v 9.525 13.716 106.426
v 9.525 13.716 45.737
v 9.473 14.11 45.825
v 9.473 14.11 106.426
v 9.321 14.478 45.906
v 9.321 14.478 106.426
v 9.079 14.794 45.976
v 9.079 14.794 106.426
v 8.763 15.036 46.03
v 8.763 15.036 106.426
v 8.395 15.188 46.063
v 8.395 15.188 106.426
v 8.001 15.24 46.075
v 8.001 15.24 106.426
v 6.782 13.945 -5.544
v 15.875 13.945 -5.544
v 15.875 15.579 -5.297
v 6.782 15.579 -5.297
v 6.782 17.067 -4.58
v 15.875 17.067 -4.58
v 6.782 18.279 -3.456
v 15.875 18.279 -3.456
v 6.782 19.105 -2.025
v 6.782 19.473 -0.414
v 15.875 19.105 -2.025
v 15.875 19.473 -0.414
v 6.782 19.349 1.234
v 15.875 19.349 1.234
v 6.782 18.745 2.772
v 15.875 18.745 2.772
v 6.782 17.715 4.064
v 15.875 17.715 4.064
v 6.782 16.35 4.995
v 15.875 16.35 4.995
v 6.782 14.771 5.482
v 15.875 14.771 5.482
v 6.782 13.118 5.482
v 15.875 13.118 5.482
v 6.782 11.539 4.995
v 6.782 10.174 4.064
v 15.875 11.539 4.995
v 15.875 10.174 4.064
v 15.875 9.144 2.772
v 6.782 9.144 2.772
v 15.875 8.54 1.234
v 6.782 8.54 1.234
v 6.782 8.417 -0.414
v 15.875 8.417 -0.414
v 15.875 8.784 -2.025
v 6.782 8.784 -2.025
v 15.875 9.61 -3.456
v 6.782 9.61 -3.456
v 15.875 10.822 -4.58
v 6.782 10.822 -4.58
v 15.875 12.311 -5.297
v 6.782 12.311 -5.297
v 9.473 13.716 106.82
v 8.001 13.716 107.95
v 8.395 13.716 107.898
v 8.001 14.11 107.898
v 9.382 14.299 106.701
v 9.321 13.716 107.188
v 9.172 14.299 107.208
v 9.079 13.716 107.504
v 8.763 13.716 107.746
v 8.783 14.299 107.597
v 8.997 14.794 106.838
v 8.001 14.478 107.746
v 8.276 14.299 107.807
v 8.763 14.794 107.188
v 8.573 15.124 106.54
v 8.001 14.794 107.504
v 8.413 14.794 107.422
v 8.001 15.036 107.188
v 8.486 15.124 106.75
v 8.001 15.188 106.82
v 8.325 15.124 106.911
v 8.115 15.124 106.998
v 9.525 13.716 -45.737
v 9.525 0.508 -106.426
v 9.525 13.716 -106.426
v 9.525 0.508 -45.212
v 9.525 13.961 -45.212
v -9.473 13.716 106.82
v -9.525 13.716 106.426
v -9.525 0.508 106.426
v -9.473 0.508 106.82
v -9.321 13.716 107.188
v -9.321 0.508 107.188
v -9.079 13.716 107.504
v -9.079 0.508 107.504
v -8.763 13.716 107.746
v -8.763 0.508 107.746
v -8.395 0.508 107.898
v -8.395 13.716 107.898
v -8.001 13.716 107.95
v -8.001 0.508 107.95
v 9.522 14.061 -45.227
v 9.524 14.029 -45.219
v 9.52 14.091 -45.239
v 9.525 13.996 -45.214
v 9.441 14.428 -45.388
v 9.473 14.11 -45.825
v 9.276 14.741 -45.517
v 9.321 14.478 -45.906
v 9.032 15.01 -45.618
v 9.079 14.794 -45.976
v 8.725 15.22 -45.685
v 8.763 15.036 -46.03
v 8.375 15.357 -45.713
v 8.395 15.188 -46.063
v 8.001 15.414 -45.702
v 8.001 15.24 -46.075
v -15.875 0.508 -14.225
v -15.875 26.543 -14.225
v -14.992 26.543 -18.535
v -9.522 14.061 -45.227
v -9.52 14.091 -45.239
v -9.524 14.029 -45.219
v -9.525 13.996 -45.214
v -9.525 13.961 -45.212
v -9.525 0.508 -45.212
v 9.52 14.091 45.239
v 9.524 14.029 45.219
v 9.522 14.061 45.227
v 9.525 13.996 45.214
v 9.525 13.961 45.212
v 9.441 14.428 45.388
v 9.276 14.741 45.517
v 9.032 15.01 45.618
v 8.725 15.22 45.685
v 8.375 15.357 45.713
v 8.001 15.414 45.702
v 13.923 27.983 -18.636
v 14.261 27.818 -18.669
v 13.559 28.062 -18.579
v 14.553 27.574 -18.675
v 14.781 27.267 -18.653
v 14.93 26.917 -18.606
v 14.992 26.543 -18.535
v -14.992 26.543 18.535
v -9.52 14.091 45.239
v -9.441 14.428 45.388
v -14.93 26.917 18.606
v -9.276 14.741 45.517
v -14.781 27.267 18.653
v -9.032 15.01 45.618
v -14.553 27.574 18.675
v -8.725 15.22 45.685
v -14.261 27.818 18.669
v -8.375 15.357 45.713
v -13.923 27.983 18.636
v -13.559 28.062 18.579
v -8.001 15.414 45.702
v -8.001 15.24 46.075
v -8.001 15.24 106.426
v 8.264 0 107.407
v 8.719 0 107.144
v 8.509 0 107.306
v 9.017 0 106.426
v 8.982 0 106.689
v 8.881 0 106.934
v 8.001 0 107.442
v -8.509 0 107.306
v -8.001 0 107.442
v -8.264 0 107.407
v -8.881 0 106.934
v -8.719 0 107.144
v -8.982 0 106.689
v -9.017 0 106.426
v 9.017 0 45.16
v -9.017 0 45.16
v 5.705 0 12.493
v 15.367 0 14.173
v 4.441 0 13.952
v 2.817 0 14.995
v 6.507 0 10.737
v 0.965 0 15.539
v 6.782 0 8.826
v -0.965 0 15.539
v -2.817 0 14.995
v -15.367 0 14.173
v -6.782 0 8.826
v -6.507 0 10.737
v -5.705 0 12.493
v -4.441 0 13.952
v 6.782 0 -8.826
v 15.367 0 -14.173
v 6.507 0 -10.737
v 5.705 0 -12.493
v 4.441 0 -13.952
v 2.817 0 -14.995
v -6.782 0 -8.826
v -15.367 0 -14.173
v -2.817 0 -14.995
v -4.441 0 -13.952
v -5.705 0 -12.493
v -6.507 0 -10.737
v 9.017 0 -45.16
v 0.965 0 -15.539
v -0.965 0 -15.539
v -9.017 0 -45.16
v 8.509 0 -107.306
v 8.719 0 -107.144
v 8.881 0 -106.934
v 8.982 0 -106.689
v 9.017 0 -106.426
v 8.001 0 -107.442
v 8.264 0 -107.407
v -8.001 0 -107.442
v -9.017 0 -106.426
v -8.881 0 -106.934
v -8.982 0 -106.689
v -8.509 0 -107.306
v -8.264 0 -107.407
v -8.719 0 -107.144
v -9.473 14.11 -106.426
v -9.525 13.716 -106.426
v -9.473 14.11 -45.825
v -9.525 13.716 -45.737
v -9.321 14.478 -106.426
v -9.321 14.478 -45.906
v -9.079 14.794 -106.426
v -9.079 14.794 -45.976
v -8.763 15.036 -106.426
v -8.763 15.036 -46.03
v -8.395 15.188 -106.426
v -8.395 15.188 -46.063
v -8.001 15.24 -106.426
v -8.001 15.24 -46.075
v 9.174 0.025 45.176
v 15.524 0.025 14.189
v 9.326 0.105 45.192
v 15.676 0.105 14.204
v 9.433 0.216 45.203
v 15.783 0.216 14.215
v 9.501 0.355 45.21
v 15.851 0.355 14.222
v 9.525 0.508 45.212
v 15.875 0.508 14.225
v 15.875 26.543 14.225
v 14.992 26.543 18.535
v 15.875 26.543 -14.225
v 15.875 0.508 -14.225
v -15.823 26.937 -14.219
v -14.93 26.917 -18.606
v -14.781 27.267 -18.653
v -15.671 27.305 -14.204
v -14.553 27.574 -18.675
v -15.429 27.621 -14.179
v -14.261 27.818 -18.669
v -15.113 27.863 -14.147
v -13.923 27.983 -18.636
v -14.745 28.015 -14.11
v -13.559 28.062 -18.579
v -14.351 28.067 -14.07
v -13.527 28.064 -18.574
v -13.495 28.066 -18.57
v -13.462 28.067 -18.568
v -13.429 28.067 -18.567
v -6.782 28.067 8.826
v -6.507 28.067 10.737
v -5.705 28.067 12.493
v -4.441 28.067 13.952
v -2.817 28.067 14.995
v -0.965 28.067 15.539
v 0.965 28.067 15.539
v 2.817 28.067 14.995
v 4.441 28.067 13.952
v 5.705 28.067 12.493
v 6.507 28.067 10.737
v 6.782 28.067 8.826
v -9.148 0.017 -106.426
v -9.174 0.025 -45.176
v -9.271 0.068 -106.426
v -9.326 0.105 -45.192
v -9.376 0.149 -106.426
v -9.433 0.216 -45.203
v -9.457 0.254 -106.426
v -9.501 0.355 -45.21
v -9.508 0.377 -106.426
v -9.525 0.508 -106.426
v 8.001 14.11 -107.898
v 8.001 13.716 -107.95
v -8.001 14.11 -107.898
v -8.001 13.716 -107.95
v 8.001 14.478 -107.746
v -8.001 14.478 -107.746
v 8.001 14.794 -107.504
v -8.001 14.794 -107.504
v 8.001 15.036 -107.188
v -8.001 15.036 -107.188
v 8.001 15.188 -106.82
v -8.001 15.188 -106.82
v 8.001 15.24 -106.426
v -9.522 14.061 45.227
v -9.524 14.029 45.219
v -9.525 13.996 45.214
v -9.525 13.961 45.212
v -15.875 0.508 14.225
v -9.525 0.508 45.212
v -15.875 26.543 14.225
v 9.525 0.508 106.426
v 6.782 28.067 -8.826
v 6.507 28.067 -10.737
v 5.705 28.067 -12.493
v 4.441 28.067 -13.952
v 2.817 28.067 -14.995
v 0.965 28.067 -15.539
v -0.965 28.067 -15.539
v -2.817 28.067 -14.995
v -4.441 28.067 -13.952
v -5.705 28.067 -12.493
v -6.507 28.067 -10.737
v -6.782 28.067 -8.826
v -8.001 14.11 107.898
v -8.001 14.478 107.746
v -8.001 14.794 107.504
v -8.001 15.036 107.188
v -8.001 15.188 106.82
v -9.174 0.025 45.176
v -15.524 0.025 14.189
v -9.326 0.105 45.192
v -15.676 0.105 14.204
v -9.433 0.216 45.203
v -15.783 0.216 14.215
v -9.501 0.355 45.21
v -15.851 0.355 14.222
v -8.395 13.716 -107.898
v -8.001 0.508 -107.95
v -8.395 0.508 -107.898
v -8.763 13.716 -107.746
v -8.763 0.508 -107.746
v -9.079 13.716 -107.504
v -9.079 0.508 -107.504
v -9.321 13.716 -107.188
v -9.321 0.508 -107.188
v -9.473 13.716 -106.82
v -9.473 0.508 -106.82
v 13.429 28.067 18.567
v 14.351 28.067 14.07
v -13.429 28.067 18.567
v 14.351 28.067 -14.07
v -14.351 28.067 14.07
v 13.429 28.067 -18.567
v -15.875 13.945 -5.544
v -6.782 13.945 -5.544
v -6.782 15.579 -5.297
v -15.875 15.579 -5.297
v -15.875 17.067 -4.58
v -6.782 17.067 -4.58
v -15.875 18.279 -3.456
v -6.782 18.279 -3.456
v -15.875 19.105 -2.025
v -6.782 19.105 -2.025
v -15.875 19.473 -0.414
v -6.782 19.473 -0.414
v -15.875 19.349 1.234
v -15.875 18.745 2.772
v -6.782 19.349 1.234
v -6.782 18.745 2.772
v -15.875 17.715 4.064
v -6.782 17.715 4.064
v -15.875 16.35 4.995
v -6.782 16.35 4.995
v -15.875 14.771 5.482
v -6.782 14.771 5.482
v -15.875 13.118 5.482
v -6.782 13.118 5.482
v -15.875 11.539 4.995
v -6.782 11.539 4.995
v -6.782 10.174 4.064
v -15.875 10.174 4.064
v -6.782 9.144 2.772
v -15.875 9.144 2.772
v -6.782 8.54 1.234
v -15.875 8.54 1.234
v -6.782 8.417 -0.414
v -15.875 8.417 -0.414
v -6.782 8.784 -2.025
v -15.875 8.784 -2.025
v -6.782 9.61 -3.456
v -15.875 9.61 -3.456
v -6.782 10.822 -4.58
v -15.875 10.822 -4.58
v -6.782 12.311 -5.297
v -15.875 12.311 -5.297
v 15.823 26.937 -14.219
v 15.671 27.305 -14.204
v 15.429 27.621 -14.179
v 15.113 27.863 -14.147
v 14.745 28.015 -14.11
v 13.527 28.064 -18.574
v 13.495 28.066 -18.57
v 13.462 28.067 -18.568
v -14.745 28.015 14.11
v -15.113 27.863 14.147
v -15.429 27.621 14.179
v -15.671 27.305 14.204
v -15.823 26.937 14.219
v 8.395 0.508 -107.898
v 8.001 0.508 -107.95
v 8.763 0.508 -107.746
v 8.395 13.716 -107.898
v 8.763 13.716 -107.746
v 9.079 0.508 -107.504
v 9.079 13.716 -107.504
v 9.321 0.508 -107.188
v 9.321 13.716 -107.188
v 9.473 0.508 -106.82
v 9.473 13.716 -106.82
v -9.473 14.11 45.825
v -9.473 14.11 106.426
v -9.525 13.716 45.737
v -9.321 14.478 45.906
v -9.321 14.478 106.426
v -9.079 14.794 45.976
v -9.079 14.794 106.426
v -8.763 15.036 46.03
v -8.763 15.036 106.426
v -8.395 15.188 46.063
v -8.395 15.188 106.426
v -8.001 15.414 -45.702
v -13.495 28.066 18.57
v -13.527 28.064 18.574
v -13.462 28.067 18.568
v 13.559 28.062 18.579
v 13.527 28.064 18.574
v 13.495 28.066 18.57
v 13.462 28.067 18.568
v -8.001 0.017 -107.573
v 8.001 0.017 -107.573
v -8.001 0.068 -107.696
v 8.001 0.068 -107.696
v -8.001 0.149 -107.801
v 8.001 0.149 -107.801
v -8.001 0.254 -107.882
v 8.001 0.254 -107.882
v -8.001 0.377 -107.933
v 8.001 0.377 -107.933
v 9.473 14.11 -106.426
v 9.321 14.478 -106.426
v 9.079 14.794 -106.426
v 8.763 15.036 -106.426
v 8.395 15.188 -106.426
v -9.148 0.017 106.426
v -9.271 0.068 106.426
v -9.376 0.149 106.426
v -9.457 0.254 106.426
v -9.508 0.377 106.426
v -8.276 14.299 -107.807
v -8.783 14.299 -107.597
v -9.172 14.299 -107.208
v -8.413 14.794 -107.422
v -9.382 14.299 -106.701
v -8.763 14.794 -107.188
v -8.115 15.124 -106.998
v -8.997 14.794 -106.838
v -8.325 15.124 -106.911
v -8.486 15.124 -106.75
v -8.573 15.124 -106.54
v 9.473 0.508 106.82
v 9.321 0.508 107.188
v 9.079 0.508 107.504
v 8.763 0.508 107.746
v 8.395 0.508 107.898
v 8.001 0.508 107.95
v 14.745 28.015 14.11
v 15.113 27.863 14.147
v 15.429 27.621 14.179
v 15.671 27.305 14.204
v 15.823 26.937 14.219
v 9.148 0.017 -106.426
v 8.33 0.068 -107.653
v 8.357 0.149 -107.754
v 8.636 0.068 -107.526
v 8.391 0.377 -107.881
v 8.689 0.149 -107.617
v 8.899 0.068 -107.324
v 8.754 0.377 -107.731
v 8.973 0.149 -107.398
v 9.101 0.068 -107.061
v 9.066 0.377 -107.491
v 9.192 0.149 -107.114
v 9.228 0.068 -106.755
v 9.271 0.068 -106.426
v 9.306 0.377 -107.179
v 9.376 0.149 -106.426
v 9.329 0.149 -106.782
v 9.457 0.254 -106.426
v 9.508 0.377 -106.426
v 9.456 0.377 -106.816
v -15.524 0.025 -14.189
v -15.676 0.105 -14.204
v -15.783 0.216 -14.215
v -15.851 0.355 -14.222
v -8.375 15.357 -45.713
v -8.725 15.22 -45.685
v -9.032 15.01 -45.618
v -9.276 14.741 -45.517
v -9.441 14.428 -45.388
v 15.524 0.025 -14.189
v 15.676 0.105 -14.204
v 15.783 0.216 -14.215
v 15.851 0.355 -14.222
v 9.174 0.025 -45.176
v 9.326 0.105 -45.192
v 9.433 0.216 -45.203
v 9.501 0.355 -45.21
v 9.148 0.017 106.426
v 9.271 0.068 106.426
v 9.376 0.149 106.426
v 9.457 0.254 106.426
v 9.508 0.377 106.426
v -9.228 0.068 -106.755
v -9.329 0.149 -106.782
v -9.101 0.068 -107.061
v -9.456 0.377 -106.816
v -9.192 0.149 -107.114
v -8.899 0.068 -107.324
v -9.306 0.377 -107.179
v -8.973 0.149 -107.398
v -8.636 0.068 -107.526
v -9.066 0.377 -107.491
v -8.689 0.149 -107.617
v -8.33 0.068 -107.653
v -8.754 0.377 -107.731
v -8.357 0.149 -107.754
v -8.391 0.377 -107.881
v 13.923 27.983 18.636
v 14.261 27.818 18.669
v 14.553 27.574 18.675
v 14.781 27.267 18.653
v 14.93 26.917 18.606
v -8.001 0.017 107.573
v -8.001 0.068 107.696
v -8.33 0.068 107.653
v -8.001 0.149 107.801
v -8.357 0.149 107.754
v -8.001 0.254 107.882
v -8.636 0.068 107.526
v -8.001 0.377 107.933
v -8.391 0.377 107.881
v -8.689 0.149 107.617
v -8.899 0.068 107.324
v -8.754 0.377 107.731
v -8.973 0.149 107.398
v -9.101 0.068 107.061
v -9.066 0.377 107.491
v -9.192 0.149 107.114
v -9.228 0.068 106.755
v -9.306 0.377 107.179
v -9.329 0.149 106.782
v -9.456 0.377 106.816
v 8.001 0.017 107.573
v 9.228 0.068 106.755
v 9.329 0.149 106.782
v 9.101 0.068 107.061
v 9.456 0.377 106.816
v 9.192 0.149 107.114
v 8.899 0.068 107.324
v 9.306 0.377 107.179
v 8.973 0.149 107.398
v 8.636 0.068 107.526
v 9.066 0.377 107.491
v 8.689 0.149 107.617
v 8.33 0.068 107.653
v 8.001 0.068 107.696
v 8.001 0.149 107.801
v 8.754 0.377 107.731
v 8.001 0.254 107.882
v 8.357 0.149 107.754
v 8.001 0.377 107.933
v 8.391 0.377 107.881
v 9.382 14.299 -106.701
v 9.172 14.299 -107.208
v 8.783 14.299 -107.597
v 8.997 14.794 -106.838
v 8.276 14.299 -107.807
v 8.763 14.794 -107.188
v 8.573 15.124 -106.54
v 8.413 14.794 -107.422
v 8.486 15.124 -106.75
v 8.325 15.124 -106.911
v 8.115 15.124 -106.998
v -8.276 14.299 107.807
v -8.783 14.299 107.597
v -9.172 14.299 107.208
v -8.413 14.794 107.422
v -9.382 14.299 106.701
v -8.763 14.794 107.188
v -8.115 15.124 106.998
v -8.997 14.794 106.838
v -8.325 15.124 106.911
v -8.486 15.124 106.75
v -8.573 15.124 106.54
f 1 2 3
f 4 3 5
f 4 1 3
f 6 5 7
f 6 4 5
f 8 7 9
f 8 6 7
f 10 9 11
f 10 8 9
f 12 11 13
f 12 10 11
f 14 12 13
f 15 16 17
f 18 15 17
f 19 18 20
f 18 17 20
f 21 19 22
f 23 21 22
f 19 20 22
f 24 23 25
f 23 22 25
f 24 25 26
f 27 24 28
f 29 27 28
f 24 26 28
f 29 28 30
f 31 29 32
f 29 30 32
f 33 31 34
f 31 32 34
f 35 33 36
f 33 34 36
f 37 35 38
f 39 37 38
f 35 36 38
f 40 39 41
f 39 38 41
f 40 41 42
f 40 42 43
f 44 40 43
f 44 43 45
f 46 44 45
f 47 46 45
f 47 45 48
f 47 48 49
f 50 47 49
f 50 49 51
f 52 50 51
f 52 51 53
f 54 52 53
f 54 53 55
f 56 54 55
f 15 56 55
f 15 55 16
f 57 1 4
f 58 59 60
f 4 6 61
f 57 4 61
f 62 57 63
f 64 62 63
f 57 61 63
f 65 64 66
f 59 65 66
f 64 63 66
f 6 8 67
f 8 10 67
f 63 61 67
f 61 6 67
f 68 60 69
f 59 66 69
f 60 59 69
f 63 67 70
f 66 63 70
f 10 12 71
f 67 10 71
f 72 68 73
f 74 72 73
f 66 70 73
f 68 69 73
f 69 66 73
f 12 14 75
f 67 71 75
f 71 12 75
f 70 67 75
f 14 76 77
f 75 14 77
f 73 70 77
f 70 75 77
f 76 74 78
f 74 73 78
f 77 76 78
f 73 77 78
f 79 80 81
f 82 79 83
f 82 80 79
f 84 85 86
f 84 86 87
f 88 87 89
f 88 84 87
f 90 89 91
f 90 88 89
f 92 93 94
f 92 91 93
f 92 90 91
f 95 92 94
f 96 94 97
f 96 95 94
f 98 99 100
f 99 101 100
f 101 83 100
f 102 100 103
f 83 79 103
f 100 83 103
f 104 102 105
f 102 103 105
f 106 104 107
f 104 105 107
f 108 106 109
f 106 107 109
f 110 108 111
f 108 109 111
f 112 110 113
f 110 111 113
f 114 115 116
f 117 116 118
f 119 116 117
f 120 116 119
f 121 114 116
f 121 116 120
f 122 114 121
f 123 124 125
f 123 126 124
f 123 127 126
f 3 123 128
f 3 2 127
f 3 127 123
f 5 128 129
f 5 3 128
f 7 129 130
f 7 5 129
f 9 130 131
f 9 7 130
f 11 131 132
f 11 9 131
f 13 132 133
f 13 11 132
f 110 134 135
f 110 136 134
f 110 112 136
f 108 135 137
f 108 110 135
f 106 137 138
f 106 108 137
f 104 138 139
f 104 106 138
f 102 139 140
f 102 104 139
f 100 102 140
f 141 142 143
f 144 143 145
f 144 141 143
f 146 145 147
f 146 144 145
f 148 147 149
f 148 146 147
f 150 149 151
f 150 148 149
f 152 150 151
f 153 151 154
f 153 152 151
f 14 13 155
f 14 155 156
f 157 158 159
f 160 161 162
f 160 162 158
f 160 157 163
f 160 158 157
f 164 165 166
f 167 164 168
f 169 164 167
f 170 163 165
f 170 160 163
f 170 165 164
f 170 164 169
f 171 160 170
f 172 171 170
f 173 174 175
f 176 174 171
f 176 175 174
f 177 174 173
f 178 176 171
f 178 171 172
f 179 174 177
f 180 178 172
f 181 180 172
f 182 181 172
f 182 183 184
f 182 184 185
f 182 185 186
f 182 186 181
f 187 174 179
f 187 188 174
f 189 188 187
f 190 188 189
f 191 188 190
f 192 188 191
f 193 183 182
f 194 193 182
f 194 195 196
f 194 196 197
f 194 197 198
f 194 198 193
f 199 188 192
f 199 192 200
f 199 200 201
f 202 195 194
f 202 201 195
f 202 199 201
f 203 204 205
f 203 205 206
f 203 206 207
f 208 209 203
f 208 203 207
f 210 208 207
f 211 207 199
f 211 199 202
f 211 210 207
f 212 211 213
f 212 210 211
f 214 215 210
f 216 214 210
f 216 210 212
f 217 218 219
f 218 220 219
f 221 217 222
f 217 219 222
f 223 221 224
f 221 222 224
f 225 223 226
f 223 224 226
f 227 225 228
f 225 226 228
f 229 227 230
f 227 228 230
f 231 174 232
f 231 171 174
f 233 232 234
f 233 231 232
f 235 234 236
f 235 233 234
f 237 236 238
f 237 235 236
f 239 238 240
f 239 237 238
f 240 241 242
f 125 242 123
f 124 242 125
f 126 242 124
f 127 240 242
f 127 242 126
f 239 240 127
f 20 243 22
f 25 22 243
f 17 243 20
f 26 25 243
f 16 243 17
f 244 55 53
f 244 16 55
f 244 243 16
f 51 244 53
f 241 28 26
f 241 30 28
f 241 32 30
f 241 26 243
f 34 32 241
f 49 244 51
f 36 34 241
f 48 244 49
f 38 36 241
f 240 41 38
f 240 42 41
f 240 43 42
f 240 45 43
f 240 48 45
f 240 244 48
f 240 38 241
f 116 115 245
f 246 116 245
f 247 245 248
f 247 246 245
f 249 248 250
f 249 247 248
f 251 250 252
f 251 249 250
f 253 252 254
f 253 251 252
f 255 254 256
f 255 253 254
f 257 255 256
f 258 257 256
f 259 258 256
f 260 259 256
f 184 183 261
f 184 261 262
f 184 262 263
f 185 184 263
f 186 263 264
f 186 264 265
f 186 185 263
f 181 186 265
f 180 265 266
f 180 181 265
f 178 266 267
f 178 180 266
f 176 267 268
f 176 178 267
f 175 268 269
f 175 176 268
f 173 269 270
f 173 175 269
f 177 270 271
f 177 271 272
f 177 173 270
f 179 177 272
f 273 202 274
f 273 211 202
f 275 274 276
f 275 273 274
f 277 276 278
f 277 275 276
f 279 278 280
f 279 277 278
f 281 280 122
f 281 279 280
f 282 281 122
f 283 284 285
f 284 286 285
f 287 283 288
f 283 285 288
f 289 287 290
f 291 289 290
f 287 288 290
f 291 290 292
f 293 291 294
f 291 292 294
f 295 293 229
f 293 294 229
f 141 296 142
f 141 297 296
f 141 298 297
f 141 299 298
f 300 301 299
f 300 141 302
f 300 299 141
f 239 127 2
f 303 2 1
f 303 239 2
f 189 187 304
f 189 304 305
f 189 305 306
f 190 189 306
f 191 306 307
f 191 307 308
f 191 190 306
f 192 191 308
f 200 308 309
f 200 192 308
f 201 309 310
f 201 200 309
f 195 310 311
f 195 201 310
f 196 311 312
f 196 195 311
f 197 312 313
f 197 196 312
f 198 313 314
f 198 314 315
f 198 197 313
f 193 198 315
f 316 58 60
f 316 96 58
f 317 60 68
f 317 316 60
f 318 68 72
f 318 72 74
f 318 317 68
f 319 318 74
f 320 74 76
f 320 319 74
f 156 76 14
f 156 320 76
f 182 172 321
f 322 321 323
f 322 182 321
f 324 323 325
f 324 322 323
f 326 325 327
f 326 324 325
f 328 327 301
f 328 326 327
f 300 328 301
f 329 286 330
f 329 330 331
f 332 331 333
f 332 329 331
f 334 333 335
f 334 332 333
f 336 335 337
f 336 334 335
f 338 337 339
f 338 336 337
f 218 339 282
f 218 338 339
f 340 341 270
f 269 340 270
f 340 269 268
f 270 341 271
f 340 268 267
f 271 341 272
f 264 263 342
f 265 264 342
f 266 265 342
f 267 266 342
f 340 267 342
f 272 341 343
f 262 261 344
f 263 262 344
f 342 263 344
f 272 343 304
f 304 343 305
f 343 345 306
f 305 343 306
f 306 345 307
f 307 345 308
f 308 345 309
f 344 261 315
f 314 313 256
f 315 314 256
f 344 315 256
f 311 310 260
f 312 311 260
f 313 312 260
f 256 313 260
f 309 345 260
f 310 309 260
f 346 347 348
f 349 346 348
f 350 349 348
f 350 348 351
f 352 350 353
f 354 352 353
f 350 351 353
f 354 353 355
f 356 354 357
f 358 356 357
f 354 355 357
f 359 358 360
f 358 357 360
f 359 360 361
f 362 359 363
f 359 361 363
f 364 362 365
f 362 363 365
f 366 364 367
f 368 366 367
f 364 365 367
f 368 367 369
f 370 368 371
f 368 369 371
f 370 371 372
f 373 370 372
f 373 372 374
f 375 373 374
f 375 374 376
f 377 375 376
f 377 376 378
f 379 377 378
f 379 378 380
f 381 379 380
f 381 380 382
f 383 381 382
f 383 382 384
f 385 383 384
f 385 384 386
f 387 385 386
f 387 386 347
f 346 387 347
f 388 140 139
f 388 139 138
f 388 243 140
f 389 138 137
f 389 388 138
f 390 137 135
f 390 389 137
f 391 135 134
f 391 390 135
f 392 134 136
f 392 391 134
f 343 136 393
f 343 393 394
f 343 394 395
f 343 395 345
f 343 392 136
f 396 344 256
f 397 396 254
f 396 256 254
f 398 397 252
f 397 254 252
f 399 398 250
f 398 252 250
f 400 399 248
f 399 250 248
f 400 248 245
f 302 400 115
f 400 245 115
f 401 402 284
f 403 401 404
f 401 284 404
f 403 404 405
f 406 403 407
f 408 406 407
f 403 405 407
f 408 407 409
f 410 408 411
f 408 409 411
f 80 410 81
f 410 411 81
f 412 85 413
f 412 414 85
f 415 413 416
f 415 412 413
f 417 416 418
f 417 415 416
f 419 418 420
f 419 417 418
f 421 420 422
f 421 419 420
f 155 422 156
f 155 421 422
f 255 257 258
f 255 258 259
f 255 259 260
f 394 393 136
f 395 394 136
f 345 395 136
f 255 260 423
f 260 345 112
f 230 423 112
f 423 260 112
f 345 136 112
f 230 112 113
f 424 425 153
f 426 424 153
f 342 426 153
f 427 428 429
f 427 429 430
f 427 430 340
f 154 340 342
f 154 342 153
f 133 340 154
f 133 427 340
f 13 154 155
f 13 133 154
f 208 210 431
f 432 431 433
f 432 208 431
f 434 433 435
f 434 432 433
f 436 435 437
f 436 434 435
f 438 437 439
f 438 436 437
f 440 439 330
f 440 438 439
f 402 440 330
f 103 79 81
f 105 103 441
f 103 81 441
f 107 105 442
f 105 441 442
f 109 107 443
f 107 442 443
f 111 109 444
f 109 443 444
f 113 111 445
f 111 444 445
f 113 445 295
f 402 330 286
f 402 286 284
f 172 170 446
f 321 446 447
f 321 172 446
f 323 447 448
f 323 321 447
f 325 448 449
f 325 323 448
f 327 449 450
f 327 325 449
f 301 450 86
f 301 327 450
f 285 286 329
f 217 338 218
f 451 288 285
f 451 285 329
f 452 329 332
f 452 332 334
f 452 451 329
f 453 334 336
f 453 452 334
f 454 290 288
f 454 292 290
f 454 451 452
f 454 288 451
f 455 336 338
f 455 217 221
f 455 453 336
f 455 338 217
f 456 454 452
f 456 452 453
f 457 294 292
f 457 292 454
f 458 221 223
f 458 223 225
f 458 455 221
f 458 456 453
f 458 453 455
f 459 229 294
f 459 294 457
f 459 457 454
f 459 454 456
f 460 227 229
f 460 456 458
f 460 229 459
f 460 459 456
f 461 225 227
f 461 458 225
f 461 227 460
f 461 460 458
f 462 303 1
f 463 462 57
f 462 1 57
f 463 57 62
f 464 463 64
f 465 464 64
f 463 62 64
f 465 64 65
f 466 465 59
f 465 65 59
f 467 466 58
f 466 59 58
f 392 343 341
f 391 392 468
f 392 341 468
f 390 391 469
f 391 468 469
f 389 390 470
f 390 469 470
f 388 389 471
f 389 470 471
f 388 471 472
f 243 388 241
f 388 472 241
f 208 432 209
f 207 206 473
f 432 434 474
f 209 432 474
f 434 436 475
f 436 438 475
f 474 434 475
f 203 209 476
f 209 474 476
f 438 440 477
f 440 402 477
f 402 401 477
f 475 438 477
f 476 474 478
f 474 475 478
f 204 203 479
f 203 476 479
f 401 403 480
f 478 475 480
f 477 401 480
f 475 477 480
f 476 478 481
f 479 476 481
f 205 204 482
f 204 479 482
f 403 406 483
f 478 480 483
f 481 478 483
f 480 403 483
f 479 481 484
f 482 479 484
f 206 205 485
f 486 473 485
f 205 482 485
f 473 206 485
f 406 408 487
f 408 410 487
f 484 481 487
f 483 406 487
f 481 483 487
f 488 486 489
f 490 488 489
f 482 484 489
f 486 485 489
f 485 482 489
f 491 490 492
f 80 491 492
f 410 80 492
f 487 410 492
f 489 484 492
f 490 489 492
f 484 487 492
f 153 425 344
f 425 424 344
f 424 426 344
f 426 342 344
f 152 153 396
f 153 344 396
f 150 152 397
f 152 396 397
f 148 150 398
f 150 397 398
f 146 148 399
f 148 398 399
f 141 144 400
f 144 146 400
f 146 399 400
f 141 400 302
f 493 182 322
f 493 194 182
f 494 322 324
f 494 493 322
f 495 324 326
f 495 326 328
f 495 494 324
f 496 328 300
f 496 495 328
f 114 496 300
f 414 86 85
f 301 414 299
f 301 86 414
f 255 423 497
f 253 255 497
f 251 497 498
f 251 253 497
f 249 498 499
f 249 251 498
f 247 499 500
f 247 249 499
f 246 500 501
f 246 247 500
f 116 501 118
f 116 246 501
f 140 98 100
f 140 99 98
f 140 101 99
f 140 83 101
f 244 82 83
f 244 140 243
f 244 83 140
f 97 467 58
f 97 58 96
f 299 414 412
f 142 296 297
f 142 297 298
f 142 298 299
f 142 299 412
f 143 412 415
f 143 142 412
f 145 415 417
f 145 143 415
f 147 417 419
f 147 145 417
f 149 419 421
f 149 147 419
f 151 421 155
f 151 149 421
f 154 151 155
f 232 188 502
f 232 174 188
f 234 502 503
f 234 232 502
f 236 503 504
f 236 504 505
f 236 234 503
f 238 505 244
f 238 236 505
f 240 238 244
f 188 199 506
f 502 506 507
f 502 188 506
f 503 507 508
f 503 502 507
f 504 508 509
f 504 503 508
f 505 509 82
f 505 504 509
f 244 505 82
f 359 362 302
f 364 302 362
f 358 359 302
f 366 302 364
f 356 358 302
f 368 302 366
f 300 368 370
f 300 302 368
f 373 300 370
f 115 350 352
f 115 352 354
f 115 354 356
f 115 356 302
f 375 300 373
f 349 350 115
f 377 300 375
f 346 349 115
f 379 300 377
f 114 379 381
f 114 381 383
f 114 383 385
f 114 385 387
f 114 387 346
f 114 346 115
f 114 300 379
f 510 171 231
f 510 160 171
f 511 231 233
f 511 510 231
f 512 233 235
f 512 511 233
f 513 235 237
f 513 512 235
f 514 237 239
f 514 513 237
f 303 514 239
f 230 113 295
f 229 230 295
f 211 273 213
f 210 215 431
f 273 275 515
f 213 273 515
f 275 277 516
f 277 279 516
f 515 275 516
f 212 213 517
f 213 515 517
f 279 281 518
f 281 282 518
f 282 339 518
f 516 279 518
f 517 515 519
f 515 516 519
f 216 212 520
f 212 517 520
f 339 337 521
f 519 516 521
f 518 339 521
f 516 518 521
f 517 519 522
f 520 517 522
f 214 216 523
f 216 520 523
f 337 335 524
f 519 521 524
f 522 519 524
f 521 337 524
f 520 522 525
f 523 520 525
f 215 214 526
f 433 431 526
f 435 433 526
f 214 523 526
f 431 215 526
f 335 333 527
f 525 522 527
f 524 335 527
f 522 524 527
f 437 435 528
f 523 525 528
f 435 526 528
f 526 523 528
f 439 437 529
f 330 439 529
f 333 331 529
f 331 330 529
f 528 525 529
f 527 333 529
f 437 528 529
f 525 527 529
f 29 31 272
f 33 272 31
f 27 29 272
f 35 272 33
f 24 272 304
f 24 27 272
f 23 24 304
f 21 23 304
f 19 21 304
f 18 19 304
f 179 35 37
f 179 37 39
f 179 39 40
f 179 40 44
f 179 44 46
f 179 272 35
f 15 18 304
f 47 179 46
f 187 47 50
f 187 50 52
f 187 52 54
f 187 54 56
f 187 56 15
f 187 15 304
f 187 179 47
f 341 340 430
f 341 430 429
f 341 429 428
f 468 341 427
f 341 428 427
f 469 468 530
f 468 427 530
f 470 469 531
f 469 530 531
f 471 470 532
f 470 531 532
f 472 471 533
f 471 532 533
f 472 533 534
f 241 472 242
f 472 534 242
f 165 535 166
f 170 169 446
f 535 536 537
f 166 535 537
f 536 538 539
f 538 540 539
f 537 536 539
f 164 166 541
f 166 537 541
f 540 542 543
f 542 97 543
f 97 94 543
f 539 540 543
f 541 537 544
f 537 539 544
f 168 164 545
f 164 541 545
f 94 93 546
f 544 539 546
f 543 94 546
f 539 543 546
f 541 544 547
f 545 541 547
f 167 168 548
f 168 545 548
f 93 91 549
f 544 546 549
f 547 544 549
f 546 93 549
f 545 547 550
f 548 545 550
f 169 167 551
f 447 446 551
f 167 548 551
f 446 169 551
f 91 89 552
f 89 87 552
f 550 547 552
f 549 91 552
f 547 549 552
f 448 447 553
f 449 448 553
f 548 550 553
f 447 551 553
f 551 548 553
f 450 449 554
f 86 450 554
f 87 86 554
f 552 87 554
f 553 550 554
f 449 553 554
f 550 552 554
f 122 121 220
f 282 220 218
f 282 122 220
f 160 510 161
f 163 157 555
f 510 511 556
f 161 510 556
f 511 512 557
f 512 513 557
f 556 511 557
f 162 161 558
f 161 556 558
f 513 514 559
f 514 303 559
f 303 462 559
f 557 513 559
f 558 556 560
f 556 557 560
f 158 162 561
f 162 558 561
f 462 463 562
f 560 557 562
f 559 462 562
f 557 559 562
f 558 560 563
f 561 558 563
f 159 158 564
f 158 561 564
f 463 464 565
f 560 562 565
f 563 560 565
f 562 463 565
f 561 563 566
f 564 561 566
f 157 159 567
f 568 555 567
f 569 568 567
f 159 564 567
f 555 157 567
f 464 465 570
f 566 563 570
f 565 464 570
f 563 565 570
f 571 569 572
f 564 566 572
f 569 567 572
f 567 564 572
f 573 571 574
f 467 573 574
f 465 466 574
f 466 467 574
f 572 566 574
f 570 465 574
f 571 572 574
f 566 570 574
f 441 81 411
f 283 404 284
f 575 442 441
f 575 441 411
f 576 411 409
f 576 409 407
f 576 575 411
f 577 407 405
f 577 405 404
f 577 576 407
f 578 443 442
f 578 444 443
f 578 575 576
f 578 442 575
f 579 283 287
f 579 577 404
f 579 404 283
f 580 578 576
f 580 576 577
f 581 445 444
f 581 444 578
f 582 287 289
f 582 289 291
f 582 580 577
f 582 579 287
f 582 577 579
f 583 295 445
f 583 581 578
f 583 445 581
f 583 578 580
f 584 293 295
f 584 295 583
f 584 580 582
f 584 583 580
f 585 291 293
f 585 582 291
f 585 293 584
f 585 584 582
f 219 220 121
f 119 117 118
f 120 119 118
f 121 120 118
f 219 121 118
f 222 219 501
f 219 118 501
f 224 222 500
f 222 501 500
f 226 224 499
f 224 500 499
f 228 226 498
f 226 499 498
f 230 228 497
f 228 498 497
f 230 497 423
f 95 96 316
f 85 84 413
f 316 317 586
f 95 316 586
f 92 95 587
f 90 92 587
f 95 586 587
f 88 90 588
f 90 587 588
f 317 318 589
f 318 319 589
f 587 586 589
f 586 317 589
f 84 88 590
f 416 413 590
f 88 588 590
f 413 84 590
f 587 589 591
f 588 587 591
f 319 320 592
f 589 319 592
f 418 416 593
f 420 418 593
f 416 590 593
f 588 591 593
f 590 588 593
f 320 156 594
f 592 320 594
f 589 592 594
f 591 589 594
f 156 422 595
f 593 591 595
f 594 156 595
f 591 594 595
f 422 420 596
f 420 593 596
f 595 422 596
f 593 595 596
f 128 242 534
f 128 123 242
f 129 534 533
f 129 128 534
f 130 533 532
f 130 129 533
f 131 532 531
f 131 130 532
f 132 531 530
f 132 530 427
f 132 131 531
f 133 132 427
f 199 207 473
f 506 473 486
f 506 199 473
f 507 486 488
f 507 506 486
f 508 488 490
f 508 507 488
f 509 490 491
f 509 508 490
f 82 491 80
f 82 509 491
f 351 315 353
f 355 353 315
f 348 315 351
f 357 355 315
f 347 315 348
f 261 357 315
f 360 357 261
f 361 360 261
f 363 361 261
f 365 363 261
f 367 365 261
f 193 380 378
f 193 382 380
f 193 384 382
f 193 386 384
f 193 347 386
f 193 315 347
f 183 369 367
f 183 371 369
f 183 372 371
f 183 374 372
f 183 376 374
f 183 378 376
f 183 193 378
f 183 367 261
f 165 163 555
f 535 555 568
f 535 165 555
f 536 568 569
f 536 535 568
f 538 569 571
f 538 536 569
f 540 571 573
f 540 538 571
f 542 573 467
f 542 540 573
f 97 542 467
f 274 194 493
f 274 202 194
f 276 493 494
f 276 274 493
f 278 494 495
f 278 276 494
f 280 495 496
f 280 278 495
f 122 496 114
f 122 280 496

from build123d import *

# Parameters (mm, degrees)
EXTRUDE1_DEPTH     = 28.067
CUT_EXTRUDE1_DEPTH = 32.75
SKETCH3_R          = 5.54355
CUT_EXTRUDE2_DEPTH = 32.75
FILLET1_R          = 1.524
FILLET2_R          = 0.508
FILLET3_R          = 1.524


with BuildPart() as part:
    # Sketch1 → Extrude1 (new body)
    with BuildSketch(Plane(origin=(0, 0, 0), x_dir=(1, 0, 0), z_dir=(0, 1, 0))):
        Polygon((-9.525, 107.95), (9.525, 107.95), (9.525, 45.212), (15.875, 14.224508), (15.875, -14.224508), (9.525, -45.212), (9.525, -107.95), (-9.525, -107.95), (-9.525, -45.212), (-15.875, -14.224508), (-15.875, 14.224508), (-9.525, 45.212), align=None)
        with BuildLine():
            Line((-6.7818, 8.8265), (-6.7818, -8.8265))
            ThreePointArc((-6.7818, -8.8265), (0, -15.6083), (6.7818, -8.8265))
            Line((6.7818, -8.8265), (6.7818, 8.8265))
            ThreePointArc((6.7818, 8.8265), (0, 15.6083), (-6.7818, 8.8265))
        make_face(mode=Mode.SUBTRACT)
    extrude(amount=EXTRUDE1_DEPTH)

    # Sketch2 → Cut-Extrude1 (cut, through all)
    with BuildSketch(Plane(origin=(15.875, 0, 0), x_dir=(0, 0, -1), z_dir=(1, 0, 0))):
        Polygon((107.95, 28.067), (18.5674, 28.067), (46.074990269, 15.24), (107.95, 15.24), align=None)
        Polygon((-107.95, 15.24), (-107.95, 28.067), (-18.5674, 28.067), (-46.074990269, 15.24), align=None)
    extrude(amount=-CUT_EXTRUDE1_DEPTH, mode=Mode.SUBTRACT)

    # Sketch3 → Cut-Extrude2 (cut, through all)
    with BuildSketch(Plane(origin=(15.875, 0, 0), x_dir=(0, 0, -1), z_dir=(1, 0, 0))):
        with Locations((0, 13.9446)):
            Circle(SKETCH3_R)
    extrude(amount=-CUT_EXTRUDE2_DEPTH, mode=Mode.SUBTRACT)

    # Fillet1
    fillet1_edges = [part.edges().sort_by_distance(p)[0] for p in [
        (-9.525, 7.62, -107.95),
        (9.525, 7.62, -107.95),
        (9.525, 7.62, 107.95),
        (-9.525, 7.62, 107.95),
    ]]
    fillet(fillet1_edges, radius=FILLET1_R)

    # Fillet2
    fillet2_edges = [part.edges().sort_by_distance(p)[0] for p in [
        (-9.525, 0, -75.819),
        (9.525, 0, 75.819),
        (0, 0, 107.95),
        (0, 0, -107.95),
        (-9.078630735, 0, 107.503630735),
        (12.7, 0, -29.718254),
        (9.078630735, 0, 107.503630735),
        (9.078630735, 0, -107.503630735),
        (-9.078630735, 0, -107.503630735),
        (15.875, 0, 0),
        (12.7, 0, 29.718254),
        (-9.525, 0, 75.819),
        (-12.7, 0, 29.718254),
        (-15.875, 0, 0),
        (-12.7, 0, -29.718254),
        (9.525, 0, -75.819),
    ]]
    fillet(fillet2_edges, radius=FILLET2_R)

    # Fillet3
    fillet3_edges = [part.edges().sort_by_distance(p)[0] for p in [
        (0, 15.24, -107.95),
        (9.525, 15.24, -76.250495135),
        (9.078630735, 15.24, -107.503630735),
        (-9.078630735, 15.24, -107.503630735),
        (0, 15.24, 107.95),
        (-9.525, 15.24, 76.250495135),
        (-9.078630735, 15.24, 107.503630735),
        (9.078630735, 15.24, 107.503630735),
        (-15.875, 28.067, 0),
        (-15.430024263, 28.067, 16.395954),
        (15.875, 28.067, 0),
        (15.430024263, 28.067, -16.395954),
        (12.255024263, 21.854709486, -31.8897),
        (-15.430024263, 28.067, -16.395954),
        (-9.525, 15.24, -76.250495135),
        (-12.255024263, 21.854709486, -31.8897),
        (-9.525, 15.441209486, -45.643495135),
        (9.525, 15.441209486, -45.643495135),
        (15.430024263, 28.067, 16.395954),
        (12.255024263, 21.854709486, 31.8897),
        (9.525, 15.24, 76.250495135),
        (-9.525, 15.441209486, 45.643495135),
        (-12.255024263, 21.854709486, 31.8897),
        (9.525, 15.441209486, 45.643495135),
    ]]
    fillet(fillet3_edges, radius=FILLET3_R)


solid = part.part
